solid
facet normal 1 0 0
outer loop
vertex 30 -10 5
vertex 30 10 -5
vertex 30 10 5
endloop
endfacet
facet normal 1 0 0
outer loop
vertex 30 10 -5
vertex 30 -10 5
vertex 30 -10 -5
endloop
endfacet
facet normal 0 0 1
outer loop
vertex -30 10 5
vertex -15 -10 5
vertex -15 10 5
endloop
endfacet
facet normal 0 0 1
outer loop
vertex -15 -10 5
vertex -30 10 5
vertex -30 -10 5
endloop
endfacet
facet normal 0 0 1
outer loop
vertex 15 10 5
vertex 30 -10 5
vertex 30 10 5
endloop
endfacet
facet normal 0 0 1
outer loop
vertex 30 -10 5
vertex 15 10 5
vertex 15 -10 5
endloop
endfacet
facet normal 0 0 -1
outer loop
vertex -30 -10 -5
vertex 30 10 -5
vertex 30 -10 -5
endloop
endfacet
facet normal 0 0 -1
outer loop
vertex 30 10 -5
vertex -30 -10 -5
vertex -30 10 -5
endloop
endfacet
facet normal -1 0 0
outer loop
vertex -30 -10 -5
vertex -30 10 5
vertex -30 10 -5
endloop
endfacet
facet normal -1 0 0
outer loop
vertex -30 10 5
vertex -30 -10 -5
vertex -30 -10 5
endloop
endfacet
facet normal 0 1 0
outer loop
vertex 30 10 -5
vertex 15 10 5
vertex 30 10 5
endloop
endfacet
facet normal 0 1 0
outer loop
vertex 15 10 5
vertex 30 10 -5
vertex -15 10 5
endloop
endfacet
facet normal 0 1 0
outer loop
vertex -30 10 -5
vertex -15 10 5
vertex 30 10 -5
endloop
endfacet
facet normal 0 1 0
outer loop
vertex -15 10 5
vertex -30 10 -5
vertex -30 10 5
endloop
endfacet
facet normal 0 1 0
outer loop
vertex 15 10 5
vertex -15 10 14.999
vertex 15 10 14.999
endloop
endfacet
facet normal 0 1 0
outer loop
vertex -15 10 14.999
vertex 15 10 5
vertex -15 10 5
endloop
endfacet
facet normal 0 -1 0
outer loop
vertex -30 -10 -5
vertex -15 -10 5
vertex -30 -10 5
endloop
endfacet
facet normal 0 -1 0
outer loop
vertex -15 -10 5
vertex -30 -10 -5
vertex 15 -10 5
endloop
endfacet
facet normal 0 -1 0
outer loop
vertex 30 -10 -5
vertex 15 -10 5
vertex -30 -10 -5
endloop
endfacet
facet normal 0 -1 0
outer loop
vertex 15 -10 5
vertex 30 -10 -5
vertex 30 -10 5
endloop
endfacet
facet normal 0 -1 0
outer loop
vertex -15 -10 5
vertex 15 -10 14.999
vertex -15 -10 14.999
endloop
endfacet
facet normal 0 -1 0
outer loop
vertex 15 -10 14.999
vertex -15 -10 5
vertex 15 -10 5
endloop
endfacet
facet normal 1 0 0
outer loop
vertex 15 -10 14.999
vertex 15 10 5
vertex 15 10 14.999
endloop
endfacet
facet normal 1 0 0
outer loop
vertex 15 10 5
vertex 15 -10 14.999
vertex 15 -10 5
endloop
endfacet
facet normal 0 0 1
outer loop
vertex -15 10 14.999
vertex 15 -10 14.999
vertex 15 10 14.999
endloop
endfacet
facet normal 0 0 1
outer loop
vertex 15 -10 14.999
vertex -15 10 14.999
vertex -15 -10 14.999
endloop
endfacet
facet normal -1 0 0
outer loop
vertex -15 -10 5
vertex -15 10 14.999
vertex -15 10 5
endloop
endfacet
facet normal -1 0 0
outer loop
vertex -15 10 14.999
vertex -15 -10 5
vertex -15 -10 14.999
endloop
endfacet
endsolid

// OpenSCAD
cube([60, 20, 10], center=true);
translate([0, 0, 9.999])
  cube([30, 20, 10], center=true);
